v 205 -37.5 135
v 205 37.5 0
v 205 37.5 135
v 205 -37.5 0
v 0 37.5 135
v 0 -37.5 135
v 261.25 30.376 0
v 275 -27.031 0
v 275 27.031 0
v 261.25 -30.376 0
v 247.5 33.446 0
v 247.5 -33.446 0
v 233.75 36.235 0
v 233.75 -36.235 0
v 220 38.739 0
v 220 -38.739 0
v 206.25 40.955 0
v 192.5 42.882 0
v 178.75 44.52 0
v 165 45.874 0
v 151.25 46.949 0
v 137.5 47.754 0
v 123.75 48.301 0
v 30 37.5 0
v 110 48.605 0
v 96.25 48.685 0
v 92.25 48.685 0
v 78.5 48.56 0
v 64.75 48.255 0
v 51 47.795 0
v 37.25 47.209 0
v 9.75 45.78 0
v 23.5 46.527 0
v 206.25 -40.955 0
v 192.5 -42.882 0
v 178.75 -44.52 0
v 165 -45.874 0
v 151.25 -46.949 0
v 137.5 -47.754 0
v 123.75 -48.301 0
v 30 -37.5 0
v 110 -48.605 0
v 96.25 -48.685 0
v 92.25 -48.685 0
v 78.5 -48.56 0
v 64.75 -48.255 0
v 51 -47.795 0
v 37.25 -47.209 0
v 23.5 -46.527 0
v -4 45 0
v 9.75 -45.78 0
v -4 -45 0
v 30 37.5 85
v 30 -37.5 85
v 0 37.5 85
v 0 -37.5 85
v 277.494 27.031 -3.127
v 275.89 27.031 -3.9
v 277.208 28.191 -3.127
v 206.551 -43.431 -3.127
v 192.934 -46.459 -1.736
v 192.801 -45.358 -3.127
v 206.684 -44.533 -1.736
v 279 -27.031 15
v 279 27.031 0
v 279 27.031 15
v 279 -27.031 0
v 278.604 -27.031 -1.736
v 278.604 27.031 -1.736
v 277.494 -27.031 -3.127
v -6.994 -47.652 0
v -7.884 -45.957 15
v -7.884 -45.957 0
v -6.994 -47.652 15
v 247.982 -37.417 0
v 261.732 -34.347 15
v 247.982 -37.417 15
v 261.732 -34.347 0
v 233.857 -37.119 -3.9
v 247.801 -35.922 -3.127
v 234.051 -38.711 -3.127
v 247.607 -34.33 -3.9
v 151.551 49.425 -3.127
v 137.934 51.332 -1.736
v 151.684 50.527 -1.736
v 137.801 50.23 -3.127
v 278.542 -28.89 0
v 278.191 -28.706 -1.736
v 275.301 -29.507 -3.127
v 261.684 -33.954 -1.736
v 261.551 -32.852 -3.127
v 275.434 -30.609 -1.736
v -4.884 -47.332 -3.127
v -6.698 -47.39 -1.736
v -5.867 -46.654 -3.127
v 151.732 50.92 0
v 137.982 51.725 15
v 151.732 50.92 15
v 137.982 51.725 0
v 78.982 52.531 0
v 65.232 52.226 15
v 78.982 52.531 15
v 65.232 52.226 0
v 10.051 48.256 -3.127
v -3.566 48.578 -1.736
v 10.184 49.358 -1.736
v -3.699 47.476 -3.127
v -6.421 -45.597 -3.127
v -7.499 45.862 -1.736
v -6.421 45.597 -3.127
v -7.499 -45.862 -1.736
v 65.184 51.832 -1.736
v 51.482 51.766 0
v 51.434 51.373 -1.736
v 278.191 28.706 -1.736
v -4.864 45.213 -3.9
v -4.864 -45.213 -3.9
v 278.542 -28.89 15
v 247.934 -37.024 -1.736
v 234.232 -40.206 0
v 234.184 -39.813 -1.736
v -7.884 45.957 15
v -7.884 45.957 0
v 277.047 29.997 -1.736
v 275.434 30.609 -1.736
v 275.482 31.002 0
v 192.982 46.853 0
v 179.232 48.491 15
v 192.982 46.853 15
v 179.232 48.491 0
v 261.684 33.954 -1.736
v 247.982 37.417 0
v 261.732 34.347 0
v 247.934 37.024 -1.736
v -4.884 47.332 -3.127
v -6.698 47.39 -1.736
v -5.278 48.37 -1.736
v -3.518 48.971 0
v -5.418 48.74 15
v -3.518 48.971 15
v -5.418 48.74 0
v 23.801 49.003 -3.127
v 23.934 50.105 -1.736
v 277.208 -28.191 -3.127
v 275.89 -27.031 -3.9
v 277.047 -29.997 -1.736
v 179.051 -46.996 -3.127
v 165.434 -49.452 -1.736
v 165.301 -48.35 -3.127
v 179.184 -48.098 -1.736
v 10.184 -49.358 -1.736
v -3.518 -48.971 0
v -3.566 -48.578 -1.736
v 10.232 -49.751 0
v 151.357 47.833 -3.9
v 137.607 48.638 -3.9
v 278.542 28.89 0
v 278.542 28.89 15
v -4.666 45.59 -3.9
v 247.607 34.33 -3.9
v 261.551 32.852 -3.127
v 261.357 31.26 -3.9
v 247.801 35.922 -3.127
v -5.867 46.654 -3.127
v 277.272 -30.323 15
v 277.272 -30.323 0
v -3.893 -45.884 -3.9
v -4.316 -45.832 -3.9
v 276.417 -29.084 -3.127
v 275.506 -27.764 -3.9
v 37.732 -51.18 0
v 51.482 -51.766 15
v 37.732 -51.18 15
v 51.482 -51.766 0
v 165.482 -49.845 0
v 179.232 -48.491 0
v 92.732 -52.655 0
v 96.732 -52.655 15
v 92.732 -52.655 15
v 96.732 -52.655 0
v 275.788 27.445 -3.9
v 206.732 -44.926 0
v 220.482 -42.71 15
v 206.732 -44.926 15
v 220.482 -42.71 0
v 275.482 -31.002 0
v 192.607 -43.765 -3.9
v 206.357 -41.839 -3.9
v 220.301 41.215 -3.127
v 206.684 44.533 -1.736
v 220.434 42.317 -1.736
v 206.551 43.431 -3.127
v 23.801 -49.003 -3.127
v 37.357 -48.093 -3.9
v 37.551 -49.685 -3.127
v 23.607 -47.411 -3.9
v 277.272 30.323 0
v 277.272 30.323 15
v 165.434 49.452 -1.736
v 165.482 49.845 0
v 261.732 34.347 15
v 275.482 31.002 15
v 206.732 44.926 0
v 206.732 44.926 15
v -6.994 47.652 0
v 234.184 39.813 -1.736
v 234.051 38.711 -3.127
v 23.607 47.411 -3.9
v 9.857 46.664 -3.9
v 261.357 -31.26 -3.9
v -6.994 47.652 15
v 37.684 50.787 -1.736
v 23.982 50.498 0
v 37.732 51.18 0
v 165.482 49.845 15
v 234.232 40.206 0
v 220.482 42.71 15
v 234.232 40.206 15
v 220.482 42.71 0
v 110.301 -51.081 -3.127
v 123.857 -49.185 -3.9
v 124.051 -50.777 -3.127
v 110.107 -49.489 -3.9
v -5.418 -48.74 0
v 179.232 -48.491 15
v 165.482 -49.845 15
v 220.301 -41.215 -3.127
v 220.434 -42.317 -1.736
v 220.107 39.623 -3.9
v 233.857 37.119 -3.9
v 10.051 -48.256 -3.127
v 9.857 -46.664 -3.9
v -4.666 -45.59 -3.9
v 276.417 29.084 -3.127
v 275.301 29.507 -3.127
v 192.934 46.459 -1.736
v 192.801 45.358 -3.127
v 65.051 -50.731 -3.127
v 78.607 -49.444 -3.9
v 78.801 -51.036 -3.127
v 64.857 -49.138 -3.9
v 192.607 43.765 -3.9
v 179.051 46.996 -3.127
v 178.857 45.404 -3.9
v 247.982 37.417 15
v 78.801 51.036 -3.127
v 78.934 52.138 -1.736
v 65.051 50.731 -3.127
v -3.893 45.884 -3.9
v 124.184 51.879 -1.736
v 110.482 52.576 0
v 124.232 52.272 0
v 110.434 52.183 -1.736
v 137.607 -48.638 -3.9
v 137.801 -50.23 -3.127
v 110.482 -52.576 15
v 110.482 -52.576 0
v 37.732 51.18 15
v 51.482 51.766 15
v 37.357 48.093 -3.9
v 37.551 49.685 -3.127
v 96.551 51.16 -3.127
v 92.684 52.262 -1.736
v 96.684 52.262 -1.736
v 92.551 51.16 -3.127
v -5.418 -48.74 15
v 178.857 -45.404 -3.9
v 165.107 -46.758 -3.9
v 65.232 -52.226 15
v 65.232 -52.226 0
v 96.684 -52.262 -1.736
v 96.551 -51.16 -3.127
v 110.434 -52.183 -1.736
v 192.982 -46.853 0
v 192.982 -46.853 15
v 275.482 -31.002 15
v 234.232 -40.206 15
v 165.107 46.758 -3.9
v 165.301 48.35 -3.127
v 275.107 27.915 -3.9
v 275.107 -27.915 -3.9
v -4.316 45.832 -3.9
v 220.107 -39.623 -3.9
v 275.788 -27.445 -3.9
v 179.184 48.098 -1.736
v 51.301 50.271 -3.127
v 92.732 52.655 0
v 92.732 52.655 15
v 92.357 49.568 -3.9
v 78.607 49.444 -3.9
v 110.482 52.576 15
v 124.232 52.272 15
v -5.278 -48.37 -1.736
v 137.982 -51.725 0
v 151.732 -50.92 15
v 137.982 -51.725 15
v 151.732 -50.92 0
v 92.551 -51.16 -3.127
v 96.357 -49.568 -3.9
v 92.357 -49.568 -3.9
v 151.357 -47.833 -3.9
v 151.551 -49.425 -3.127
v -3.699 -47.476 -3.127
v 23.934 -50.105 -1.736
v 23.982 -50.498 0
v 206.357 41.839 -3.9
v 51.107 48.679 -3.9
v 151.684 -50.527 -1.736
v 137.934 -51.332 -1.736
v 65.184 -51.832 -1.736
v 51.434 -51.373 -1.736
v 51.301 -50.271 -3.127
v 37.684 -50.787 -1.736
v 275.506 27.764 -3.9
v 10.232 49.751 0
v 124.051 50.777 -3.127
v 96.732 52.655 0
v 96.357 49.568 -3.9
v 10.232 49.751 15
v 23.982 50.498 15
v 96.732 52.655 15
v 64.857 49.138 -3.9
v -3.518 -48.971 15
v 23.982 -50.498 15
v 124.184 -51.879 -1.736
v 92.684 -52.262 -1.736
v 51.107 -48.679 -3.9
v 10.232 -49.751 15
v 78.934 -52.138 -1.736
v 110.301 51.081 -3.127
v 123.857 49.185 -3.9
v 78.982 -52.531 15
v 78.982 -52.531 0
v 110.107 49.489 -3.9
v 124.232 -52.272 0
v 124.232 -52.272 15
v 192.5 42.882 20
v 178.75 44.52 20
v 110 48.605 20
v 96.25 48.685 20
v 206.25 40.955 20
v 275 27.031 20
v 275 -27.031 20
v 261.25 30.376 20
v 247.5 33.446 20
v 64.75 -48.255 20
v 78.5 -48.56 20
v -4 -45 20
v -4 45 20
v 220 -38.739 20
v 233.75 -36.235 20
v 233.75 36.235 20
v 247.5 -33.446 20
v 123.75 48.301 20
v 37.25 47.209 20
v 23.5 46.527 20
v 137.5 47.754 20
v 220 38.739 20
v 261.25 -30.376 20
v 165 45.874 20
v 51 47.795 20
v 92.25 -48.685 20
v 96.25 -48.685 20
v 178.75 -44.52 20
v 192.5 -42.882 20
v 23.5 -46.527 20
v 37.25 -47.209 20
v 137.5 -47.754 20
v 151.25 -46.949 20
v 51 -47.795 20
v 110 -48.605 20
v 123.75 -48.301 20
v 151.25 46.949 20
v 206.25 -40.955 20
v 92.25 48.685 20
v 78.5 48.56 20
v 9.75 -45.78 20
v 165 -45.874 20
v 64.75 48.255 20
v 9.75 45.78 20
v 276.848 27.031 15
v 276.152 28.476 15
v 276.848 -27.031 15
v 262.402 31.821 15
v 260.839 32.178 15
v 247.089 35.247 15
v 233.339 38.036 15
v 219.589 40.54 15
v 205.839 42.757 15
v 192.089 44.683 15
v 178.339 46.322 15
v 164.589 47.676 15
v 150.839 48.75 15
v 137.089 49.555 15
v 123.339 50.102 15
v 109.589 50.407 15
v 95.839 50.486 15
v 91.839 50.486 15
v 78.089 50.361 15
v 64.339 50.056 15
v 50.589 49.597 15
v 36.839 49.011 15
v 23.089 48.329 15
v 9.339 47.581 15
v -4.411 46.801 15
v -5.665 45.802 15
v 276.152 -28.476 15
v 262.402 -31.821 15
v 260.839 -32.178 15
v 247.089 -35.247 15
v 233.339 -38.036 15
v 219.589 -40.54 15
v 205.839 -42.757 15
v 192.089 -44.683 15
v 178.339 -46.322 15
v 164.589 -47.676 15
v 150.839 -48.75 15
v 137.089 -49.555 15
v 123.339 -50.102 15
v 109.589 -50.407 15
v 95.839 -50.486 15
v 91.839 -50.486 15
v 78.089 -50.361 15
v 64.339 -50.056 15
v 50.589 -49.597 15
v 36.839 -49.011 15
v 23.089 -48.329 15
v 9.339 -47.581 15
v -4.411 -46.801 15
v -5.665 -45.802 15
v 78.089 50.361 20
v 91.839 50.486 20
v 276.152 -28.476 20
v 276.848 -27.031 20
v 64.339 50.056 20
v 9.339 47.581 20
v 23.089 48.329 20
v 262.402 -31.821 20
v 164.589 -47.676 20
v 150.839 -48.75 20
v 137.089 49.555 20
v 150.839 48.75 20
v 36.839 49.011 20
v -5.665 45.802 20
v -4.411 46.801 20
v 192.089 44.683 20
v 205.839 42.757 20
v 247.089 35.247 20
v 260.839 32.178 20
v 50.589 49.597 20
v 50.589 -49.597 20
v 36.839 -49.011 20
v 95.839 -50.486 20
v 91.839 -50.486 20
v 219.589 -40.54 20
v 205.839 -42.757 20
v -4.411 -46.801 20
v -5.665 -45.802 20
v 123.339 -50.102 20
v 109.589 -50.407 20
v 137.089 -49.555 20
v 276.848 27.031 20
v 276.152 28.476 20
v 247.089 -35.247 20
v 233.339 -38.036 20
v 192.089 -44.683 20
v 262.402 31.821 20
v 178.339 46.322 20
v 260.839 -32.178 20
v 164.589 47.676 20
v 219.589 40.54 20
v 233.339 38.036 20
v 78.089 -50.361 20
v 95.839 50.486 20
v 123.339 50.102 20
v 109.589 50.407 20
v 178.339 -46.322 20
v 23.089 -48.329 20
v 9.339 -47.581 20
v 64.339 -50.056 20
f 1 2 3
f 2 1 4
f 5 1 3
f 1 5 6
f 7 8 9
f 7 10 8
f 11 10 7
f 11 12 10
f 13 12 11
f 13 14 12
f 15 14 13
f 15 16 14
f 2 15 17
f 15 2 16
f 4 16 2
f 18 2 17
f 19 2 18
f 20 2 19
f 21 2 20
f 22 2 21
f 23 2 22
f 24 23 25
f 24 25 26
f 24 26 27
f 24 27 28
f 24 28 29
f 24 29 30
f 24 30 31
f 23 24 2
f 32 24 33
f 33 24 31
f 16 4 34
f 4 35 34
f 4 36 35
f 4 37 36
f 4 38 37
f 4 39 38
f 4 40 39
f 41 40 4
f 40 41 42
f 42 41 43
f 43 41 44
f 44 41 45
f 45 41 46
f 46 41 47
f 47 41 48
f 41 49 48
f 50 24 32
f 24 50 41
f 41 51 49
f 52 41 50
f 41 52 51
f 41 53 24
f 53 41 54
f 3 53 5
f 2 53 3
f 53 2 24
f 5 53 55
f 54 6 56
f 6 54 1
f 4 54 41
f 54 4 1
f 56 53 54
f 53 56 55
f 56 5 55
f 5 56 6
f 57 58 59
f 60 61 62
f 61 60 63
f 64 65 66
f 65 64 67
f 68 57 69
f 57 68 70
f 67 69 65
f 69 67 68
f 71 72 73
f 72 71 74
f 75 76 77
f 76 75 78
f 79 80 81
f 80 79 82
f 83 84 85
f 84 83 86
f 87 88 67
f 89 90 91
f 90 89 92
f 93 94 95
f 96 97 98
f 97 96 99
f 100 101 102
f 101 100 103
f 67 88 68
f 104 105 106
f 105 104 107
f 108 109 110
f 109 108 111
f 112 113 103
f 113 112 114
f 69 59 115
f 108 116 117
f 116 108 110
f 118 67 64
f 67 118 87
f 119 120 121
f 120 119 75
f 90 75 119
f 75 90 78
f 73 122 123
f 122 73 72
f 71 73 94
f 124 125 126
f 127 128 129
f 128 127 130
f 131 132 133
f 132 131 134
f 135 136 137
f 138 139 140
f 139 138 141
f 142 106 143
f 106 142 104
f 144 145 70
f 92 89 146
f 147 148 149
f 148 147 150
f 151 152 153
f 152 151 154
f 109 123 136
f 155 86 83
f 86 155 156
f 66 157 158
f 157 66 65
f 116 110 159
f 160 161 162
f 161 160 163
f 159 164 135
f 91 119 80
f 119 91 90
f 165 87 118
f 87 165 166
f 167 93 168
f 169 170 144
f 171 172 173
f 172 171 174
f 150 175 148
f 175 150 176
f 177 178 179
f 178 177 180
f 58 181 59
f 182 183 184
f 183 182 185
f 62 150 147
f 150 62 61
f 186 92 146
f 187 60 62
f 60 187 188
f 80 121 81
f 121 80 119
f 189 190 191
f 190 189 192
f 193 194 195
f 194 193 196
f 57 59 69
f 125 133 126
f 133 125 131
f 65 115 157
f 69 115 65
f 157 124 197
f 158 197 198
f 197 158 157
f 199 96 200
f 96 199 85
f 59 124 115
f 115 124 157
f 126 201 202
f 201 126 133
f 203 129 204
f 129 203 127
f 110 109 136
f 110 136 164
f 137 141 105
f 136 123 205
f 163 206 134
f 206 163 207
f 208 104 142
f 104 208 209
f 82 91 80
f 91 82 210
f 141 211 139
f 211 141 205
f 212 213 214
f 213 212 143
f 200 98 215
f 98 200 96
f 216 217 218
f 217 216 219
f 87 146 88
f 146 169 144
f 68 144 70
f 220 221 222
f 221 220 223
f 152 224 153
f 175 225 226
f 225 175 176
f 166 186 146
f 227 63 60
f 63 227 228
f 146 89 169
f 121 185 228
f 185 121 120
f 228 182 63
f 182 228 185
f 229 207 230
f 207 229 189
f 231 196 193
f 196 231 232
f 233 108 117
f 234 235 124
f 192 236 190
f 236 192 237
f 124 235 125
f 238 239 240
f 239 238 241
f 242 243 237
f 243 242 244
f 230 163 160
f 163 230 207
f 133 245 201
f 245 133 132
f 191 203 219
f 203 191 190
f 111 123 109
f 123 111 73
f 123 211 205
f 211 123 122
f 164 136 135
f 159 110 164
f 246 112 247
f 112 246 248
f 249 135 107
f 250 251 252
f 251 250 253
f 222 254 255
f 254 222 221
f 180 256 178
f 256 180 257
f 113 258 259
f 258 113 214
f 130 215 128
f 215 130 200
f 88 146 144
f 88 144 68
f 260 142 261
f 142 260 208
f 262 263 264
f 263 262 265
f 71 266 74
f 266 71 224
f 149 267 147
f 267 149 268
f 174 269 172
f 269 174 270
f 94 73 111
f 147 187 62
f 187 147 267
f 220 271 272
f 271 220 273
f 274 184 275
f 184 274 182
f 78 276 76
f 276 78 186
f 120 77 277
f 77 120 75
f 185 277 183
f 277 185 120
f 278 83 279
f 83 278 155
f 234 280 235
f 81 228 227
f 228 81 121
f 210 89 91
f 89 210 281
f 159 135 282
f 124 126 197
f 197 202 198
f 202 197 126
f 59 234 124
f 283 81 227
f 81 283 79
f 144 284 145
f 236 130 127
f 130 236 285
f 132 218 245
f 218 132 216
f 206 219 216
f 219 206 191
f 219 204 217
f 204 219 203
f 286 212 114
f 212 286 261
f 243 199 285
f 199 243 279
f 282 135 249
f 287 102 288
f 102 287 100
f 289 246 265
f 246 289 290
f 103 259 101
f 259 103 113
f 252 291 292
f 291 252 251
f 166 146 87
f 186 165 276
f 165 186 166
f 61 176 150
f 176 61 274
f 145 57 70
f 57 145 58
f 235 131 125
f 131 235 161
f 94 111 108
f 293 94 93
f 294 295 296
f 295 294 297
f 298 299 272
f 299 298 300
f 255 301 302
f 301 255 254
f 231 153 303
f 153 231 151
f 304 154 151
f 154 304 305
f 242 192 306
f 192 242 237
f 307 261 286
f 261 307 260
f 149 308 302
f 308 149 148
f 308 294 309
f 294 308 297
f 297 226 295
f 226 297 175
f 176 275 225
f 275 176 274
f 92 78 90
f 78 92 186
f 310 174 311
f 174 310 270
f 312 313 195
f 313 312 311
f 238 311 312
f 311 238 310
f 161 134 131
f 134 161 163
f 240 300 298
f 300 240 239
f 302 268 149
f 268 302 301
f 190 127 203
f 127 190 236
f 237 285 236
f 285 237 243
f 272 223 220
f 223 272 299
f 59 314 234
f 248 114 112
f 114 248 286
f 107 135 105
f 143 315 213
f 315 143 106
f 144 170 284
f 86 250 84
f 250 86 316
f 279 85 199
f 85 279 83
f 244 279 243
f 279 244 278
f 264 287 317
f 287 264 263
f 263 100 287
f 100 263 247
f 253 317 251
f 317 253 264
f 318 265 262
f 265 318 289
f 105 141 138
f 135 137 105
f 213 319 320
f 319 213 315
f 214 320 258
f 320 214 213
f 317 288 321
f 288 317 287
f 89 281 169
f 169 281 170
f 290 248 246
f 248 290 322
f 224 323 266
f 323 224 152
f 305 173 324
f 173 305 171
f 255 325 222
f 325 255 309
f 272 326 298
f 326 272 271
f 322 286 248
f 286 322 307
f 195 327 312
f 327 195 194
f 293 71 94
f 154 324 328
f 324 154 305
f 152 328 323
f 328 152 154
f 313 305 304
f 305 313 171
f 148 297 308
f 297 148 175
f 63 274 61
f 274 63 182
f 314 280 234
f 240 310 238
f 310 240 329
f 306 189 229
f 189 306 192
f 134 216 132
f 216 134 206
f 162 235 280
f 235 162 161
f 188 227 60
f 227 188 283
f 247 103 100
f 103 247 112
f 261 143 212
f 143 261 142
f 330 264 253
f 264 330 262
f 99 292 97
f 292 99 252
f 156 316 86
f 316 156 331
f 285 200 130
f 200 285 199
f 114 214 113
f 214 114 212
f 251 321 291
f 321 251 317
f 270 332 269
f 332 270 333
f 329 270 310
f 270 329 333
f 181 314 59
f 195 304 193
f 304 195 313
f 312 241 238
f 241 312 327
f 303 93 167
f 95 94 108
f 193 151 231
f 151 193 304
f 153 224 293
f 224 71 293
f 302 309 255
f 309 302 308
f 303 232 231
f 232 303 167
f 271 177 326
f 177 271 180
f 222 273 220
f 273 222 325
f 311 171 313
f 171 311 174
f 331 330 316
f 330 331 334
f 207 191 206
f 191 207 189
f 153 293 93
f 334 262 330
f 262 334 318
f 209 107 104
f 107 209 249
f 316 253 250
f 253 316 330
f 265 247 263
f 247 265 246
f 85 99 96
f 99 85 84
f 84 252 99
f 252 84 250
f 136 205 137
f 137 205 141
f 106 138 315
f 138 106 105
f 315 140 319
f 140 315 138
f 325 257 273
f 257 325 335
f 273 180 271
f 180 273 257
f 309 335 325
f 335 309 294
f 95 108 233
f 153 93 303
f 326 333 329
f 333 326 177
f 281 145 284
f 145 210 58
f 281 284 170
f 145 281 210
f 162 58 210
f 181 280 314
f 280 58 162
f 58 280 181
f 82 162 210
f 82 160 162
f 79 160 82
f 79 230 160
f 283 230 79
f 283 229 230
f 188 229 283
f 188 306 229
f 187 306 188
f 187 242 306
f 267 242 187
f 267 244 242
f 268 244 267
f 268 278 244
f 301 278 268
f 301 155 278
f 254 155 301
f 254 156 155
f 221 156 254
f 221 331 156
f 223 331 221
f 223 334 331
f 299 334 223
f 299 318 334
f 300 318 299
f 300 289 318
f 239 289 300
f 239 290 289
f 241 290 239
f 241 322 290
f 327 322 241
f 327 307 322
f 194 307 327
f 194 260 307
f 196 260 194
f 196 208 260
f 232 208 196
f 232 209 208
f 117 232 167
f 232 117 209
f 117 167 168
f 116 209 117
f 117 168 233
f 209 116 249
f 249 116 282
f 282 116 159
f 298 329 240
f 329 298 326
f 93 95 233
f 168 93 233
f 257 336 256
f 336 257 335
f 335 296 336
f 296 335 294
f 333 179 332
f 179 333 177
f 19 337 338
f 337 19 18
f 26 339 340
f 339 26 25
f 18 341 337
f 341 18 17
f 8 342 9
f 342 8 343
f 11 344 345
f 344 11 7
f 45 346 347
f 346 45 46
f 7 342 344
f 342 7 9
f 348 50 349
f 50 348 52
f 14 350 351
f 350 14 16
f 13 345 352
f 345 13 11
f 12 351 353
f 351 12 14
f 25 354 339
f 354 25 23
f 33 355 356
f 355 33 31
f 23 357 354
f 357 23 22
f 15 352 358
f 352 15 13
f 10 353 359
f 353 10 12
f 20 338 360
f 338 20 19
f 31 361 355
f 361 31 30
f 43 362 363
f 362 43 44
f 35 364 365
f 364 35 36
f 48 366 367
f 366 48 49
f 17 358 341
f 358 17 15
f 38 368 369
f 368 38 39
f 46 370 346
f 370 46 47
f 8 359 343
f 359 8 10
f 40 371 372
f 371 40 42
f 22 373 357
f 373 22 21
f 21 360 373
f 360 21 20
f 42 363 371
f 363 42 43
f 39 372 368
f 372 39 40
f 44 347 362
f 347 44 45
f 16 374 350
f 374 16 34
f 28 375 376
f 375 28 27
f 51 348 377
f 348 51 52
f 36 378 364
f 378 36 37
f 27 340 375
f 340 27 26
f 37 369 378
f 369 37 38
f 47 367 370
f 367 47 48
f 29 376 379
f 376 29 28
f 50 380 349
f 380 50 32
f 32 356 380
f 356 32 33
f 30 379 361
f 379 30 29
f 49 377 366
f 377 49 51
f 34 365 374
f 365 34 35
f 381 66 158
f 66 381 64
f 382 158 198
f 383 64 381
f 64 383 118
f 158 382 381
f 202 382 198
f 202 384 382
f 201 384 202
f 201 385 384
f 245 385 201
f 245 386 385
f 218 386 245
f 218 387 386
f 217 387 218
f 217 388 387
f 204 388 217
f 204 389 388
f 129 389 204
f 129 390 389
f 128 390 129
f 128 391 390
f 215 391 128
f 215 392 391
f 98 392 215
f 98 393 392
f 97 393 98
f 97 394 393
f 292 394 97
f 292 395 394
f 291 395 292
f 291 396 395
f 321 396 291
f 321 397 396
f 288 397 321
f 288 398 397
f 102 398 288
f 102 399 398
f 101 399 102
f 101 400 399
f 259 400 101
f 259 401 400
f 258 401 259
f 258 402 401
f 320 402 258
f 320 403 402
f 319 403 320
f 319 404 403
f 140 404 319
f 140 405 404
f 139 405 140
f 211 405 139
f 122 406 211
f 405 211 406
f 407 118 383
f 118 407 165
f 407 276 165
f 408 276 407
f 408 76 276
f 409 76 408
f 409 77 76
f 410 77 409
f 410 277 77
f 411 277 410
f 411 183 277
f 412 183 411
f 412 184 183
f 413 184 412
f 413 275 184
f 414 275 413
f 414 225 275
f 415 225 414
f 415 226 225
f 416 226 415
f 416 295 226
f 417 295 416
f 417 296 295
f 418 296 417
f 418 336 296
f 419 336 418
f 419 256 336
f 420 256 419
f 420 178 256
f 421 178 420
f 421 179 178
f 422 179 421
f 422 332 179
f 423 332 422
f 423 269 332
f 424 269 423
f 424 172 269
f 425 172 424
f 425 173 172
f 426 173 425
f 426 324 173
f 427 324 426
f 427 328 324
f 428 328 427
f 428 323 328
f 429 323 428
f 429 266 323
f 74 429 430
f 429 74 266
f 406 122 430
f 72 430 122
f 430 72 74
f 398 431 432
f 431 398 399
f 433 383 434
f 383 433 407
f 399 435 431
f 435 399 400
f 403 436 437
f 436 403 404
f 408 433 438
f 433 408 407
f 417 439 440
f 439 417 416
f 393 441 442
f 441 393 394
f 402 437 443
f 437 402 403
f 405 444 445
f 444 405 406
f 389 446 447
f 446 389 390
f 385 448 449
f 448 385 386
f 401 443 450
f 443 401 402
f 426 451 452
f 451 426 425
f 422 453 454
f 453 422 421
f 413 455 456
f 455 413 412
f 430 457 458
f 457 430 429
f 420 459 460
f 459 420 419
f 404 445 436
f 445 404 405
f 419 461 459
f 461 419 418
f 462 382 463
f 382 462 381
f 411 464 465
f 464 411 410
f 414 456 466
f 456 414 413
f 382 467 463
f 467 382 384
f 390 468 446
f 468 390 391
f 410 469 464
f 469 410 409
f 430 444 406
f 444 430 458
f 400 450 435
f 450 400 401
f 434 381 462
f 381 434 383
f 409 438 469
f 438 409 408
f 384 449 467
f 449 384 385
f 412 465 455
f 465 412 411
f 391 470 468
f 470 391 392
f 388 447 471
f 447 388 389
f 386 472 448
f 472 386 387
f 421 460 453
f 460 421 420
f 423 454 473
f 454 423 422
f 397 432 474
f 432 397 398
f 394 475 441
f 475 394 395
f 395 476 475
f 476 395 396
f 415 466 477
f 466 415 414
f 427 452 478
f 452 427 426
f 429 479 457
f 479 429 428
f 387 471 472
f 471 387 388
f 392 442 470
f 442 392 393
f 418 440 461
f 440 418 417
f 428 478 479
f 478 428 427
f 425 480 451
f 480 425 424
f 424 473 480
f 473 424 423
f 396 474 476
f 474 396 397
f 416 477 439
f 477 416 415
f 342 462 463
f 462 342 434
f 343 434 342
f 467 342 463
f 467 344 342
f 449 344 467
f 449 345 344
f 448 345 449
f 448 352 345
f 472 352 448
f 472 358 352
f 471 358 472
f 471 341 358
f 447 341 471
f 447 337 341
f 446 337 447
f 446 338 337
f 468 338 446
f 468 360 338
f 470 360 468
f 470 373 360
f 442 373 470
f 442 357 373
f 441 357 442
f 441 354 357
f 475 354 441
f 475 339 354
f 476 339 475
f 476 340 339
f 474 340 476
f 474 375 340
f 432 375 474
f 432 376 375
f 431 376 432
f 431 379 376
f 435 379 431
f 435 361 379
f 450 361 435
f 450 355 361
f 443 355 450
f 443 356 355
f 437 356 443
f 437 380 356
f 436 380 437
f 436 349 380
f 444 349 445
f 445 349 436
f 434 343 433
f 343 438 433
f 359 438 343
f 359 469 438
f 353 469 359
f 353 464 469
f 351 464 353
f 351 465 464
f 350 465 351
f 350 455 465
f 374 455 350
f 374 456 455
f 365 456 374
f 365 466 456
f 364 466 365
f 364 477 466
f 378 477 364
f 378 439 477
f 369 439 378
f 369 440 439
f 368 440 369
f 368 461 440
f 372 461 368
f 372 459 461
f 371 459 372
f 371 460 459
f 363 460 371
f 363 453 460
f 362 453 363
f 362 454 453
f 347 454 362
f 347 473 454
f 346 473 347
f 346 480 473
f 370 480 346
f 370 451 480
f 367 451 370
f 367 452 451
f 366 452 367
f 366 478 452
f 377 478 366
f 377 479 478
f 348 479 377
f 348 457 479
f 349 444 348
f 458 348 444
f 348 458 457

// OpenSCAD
akkuL=205;
akkuLk=175;
akkuHk=50;
akkuB=75;
akkuH=135;

w1=4;

akkuK();




unterteil(w1,15) roh();
unterteil(w1/2,20)  roh();
//halter();



module unterteil(d, h) {
	difference() {
		gehaeuse(d) children();
		translate([-10, -75, h]) cube([270*2, 75*2, 50]);
	}
}


module gehaeuse(d) {
	difference() {
		grow(d) children();
		children();
	}
}

module grow(d) {
	minkowski() {
		children();
		sphere(r=d);
	}
}


module roh() {
hull()
stege();
}

module halter()  {
translate([200,100,4])
rotate([90,0,-90])
difference() {
import("/Users/marc/Documents/3d/case.stl");
translate([50,0,-100]) cube([100,200,300]);
translate([50,-15,-110]) cube([100,30,100]);
}
}

module stege(N=20)  {
	l=275;
	d=l/N;

	translate([-w1,0,0])
		for (i=[0:N]) {
			platte(i*d, 30, 90+sin(i/N*180)*10-pow(i/N*3.3,3));
		}
}


module platte(x,h,w)
{
translate([x,-w/2,0])
cube([w1,w,h]);
}

module akkuK() 
{
	color( "LightSkyBlue", 1.0 ) {
		translate([0, -akkuB/2,0]) {	
			translate([akkuL-akkuLk, 0,0]) cube([akkuLk, akkuB, akkuH]);
			translate([0, 0,akkuH-akkuHk]) cube([akkuL, akkuB, akkuHk]);
		}
	}
}
